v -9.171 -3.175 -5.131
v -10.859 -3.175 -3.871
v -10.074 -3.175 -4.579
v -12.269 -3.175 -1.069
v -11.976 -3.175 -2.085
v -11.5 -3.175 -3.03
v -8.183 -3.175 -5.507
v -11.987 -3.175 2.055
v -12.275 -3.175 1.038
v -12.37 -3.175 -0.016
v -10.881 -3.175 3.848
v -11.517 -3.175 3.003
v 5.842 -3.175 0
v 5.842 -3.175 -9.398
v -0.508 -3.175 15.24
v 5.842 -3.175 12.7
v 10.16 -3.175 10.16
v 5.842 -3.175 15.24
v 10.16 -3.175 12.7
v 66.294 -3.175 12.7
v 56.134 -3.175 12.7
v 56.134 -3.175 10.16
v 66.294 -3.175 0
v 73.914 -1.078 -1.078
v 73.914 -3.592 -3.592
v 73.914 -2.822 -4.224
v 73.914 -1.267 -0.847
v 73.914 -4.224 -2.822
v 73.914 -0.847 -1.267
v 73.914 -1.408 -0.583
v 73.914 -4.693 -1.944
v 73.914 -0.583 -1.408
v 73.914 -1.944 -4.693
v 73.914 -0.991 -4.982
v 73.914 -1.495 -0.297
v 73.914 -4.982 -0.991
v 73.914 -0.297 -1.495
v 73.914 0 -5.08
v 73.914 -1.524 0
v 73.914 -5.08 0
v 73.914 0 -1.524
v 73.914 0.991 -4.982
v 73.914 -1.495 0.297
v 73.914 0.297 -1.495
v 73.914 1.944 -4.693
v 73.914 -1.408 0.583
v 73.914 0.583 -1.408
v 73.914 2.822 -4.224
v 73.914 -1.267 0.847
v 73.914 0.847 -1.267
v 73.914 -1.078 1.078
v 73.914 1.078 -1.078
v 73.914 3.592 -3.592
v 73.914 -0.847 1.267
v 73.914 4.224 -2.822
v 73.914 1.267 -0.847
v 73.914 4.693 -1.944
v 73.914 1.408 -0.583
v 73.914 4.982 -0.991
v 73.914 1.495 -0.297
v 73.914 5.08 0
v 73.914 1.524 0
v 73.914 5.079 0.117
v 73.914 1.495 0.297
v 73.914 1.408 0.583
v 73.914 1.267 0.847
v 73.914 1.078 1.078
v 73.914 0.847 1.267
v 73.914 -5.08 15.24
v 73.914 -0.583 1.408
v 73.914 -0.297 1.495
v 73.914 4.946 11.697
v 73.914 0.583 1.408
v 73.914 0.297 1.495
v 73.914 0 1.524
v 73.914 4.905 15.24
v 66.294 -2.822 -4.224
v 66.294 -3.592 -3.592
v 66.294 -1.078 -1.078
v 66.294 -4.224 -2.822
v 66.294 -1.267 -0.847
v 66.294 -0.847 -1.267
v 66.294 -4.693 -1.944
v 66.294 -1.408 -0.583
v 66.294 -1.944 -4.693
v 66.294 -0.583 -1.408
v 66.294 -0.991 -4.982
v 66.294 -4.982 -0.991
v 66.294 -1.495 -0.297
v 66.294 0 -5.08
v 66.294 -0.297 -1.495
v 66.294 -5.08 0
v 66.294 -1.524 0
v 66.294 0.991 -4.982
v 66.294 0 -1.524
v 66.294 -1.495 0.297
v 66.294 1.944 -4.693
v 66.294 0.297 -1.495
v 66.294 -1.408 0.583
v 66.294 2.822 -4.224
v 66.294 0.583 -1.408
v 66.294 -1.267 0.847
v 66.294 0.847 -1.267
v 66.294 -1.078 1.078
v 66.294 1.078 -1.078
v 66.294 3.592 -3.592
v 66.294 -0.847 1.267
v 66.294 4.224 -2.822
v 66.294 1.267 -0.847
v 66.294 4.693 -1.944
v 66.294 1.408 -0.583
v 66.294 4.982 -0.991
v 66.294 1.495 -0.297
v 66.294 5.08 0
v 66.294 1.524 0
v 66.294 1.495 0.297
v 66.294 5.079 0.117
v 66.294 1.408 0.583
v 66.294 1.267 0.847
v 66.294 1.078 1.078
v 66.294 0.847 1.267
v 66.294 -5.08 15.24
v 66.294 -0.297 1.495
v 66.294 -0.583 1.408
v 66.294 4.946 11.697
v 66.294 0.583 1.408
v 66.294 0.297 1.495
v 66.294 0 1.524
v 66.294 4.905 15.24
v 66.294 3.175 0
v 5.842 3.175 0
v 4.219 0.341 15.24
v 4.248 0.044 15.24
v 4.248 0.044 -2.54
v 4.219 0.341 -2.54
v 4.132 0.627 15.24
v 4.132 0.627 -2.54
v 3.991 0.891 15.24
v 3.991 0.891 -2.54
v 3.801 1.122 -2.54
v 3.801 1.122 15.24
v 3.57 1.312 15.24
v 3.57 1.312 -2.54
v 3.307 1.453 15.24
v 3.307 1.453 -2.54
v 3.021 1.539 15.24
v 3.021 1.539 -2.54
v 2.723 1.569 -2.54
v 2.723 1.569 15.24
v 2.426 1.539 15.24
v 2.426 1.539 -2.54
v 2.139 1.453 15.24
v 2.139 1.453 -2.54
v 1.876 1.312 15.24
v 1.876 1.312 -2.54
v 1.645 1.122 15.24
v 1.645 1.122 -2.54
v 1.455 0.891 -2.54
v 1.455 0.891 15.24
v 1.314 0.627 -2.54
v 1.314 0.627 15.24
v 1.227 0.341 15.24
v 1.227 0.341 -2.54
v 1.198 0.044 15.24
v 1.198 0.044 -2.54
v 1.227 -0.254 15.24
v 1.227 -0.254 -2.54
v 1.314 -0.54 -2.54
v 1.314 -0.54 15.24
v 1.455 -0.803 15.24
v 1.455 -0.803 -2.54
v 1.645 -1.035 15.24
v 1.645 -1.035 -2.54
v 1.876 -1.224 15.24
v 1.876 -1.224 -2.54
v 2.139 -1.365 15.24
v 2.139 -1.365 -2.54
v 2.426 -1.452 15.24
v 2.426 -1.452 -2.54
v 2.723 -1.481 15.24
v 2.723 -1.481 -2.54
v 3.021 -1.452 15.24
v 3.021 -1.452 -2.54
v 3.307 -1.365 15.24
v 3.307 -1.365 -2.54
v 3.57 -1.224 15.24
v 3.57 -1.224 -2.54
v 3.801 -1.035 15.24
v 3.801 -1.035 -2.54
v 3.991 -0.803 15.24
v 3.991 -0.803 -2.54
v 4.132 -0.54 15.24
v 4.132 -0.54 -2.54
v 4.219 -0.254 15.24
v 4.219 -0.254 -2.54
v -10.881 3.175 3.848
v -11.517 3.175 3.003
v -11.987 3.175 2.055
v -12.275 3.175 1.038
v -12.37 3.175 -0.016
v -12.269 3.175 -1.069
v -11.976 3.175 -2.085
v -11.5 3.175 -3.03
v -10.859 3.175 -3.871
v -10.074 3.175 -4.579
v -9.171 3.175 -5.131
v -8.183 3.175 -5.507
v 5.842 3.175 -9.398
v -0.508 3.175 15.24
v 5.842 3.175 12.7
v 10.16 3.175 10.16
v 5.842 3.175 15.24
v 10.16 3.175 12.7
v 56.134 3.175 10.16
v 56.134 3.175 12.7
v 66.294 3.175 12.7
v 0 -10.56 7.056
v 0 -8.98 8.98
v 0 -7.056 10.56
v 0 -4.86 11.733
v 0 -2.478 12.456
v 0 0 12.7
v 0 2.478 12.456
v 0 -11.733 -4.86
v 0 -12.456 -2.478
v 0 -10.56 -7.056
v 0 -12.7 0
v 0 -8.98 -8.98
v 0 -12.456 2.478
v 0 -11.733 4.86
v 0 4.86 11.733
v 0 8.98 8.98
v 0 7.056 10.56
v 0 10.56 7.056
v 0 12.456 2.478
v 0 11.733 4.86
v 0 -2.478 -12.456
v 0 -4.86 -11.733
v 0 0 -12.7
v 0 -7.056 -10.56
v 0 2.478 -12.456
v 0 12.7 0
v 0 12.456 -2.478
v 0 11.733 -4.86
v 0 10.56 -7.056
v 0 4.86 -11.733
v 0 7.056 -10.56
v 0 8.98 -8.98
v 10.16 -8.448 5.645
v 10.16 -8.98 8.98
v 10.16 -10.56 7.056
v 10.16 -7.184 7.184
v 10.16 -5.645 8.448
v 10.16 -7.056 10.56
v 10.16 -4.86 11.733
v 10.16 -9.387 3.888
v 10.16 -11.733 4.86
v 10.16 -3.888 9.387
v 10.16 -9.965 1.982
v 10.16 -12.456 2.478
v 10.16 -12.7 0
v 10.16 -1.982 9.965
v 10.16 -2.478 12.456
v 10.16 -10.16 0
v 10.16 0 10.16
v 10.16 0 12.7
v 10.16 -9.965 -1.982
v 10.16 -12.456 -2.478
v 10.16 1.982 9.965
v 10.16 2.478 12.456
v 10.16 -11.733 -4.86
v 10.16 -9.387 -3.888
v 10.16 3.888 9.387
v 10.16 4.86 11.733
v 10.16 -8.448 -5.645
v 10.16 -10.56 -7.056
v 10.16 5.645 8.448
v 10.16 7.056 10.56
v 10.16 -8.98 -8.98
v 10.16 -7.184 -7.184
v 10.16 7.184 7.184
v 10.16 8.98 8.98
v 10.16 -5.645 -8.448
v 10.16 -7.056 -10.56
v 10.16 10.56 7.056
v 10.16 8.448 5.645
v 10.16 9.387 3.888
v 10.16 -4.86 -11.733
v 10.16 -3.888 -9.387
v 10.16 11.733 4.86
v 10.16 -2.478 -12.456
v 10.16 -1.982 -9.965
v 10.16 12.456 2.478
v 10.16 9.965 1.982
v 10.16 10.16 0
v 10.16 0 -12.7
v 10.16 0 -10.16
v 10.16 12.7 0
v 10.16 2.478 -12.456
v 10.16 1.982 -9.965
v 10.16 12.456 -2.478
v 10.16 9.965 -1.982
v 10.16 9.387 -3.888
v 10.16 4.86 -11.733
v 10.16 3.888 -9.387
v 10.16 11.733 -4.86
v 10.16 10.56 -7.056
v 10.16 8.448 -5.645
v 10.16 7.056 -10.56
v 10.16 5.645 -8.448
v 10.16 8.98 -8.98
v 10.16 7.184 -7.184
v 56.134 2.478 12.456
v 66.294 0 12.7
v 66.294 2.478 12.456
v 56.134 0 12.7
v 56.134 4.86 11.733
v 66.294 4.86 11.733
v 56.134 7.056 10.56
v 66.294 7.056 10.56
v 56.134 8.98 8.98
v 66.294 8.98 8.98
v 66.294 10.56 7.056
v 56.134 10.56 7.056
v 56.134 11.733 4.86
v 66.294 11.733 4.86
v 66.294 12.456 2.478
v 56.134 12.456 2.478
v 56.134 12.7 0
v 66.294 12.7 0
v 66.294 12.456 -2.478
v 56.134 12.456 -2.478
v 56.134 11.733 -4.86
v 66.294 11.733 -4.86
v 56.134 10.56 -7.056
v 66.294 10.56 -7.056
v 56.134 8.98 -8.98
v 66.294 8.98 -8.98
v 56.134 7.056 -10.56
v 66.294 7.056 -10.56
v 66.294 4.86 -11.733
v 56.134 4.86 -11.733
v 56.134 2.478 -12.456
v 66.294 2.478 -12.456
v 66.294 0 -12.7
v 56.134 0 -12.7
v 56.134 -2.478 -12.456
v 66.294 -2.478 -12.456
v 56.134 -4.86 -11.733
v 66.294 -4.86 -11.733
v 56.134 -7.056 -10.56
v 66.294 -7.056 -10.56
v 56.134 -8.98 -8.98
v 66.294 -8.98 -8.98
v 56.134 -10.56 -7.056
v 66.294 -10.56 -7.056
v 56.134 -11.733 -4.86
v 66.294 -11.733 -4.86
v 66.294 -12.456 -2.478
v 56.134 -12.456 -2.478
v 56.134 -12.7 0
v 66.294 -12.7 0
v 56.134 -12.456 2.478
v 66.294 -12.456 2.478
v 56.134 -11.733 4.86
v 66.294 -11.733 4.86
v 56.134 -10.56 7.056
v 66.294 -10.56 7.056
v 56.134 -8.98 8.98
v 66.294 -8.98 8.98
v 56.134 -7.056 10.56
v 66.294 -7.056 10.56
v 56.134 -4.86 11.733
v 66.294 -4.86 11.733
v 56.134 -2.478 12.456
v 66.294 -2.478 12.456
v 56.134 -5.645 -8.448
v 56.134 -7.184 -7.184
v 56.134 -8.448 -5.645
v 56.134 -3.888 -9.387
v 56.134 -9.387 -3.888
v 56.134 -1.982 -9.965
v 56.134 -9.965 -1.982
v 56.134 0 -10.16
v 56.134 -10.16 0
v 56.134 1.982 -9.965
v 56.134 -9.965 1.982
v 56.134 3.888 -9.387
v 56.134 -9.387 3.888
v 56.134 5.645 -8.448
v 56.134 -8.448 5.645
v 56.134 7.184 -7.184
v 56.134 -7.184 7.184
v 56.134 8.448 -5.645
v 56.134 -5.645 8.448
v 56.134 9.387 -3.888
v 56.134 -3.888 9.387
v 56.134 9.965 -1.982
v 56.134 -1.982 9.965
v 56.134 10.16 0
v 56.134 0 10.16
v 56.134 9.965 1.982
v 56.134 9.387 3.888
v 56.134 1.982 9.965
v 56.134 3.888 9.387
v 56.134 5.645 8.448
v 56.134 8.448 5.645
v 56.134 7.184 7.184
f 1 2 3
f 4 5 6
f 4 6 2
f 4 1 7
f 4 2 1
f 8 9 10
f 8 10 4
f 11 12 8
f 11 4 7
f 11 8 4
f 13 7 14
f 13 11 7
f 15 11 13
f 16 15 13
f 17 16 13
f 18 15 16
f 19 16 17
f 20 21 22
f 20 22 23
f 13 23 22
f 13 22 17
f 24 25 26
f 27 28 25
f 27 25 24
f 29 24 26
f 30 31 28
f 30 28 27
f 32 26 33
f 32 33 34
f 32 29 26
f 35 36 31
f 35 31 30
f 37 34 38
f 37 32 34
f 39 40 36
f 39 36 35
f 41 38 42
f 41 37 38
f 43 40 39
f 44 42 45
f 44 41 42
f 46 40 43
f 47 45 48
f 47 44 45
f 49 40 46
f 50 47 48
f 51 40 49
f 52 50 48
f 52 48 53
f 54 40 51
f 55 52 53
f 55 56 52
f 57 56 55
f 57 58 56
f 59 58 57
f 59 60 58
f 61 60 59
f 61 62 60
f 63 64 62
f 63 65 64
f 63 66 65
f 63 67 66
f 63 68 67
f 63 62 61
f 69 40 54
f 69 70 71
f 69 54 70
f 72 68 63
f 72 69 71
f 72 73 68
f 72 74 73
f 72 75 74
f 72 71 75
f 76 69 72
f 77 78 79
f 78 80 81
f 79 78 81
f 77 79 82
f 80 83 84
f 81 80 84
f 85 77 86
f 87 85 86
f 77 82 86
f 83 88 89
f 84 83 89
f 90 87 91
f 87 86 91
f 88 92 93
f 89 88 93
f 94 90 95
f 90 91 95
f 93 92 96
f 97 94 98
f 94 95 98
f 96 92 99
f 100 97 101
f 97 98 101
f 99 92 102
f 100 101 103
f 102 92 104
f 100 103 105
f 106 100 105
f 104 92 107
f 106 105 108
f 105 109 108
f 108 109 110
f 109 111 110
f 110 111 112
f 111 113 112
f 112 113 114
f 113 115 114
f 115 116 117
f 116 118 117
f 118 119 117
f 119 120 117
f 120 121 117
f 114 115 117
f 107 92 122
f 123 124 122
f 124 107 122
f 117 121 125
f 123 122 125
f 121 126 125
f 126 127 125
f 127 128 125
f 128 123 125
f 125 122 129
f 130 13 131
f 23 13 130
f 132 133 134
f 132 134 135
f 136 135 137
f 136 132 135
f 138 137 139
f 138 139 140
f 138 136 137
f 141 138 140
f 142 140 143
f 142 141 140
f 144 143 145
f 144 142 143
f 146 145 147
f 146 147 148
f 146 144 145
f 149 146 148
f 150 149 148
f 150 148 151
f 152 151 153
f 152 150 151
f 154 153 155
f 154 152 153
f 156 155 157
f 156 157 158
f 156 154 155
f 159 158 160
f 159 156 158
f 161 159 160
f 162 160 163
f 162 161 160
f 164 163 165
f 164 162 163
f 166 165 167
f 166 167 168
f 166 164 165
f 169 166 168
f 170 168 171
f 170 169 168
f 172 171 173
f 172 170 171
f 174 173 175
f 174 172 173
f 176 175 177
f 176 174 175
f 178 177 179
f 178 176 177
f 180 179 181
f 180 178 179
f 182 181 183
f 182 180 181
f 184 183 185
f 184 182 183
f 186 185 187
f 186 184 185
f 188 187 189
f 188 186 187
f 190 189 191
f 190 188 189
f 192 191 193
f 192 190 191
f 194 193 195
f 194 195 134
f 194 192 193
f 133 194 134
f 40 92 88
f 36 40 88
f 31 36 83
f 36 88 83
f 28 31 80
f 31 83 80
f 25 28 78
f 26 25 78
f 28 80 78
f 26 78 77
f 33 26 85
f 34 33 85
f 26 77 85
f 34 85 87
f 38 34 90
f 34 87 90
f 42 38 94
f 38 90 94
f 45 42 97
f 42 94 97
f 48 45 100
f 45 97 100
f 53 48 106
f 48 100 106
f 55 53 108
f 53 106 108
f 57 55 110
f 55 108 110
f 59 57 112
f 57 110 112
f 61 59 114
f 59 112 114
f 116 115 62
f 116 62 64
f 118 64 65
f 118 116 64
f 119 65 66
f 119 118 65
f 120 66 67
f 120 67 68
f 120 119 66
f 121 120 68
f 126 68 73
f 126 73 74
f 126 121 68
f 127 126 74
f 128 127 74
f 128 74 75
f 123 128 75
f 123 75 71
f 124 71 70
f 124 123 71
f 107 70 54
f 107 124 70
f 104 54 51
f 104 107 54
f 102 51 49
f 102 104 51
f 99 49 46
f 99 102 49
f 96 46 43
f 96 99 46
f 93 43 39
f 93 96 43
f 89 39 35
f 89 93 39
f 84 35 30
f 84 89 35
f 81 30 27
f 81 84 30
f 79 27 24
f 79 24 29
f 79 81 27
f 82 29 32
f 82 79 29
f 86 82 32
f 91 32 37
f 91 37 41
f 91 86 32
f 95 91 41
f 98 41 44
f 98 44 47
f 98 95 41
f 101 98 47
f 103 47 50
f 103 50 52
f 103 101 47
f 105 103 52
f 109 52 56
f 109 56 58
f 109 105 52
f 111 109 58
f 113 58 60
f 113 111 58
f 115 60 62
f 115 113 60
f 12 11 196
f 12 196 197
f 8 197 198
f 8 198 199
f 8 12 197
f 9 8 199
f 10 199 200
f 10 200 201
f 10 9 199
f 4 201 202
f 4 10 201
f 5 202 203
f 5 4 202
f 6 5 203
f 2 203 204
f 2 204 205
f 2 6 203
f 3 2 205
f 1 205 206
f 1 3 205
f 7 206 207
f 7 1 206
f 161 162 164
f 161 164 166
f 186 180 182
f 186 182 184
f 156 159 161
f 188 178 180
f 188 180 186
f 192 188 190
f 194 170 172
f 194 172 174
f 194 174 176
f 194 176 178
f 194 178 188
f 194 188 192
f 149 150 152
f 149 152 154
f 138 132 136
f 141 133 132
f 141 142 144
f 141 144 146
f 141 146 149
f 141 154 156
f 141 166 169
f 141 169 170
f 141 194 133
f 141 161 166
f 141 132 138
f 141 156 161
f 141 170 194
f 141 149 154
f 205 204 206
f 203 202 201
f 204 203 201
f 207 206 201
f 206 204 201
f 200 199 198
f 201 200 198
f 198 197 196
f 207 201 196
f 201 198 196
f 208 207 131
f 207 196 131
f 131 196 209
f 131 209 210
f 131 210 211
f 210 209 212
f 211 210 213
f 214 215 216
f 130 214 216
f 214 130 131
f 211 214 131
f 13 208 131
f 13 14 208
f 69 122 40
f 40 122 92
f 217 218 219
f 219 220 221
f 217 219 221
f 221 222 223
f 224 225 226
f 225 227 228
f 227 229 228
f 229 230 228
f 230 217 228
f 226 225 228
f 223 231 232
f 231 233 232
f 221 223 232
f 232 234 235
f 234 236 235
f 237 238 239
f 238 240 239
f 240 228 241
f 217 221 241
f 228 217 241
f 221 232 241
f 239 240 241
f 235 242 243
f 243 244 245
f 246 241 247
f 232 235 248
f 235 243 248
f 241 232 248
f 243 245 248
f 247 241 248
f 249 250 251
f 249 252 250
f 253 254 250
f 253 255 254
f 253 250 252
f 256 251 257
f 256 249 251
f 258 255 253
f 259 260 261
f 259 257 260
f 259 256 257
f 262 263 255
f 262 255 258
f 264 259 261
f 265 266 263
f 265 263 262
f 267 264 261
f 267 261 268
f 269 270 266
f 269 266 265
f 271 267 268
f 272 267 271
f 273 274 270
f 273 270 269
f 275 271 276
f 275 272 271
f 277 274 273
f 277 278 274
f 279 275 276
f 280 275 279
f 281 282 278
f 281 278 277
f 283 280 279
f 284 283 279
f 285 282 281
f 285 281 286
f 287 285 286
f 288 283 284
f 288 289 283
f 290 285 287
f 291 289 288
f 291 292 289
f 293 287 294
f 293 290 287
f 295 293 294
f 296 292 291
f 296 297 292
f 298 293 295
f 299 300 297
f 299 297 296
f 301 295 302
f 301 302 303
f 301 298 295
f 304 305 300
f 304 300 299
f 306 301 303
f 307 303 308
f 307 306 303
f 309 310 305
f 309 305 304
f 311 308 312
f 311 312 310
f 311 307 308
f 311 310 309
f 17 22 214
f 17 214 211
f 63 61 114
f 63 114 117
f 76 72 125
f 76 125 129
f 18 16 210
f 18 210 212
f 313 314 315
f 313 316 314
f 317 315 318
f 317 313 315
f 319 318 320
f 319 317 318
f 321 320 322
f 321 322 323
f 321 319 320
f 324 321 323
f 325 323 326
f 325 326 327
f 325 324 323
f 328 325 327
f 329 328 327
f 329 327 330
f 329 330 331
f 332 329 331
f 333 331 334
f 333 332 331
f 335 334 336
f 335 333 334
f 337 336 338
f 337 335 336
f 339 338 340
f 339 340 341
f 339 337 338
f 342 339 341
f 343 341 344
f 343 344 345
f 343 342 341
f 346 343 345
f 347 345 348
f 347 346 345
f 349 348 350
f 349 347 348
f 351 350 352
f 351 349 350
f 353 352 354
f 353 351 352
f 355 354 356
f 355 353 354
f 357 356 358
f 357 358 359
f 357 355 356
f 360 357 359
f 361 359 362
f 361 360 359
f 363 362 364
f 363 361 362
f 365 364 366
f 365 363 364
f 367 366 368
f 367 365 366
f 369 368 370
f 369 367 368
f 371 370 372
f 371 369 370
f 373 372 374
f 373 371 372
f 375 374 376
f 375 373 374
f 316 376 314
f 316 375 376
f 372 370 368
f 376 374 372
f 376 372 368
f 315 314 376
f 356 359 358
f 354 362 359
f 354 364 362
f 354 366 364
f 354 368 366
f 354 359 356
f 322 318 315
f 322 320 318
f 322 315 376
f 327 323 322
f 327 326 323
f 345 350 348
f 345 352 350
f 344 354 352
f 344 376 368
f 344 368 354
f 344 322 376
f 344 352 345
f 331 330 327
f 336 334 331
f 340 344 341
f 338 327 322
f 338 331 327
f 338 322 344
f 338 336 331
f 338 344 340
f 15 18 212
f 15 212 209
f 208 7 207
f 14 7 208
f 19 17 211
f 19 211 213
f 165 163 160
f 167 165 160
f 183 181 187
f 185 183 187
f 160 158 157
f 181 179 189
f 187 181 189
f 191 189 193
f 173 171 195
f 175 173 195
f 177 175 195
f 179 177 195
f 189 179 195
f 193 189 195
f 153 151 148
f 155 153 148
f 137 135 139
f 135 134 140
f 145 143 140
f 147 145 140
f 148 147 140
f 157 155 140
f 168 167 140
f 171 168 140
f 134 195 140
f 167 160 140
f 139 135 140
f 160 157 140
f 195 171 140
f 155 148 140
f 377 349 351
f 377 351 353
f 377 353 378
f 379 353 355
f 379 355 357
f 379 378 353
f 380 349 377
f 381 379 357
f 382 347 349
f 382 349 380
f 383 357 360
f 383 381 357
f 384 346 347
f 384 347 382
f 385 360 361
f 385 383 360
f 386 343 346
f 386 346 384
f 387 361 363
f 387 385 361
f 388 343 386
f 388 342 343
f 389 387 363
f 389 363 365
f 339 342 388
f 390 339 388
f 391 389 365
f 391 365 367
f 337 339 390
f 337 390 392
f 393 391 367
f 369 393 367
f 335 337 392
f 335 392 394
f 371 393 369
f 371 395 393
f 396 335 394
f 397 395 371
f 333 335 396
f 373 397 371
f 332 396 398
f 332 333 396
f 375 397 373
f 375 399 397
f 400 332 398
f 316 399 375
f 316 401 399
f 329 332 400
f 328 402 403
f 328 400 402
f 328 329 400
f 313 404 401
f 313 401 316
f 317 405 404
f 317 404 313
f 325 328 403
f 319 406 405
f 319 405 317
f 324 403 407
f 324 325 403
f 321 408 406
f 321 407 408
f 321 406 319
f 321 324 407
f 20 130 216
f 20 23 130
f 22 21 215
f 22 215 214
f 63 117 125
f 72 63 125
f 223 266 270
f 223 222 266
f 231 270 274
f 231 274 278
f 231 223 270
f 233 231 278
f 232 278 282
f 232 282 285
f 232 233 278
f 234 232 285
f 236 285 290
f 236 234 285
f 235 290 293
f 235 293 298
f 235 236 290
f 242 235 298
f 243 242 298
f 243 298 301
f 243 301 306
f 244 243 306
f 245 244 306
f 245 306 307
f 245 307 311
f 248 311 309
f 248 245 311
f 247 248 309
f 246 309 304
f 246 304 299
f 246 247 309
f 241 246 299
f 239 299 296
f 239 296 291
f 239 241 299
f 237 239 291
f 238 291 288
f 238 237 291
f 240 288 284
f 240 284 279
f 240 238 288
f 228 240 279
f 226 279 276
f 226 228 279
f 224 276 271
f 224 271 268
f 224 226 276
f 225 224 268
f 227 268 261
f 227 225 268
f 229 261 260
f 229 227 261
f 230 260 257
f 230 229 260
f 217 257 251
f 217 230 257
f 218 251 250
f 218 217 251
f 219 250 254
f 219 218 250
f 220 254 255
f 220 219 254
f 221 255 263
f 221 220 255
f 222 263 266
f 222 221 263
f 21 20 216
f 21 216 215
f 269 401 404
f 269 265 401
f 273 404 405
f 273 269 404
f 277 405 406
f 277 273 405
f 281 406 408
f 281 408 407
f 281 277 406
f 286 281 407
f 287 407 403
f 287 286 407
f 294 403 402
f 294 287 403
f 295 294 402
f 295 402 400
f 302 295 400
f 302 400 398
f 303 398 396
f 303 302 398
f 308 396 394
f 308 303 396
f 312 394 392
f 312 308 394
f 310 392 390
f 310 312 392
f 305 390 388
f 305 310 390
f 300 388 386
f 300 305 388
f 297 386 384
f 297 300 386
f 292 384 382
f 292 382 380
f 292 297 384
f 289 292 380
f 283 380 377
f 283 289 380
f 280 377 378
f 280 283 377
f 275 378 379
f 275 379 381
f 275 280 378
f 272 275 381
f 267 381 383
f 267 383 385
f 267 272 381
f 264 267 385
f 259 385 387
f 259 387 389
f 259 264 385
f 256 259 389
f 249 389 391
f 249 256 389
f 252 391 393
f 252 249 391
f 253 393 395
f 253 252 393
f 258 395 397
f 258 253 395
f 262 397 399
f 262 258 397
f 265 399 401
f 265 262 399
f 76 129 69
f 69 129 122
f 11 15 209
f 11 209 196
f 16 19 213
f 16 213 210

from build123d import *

# Parameters (mm, degrees)
F0_W     = 5.842
F0_H     = 12.7
F0_R     = 3.175
F2_DEPTH = 3.175
F3_R     = 1.524
F4_DEPTH = 7.62
F6_R     = 1.524984407
F7_DEPTH = 17.78
F5_R     = 1.524
F8_DEPTH = 10.414


with BuildPart() as f1:
    # F0 (on Front) → F1 (revolve)
    with BuildSketch(Plane.XZ):
        Polygon((5.842, 12.7), (5.842, 0), (66.294, 0), (66.294, 12.7), (56.134, 12.7), (56.134, 10.16), (10.16, 10.16), (10.16, 12.7), align=None)
        with Locations((2.921, 6.35)):
            Rectangle(F0_W, F0_H)
    revolve(axis=Axis((33.147, 0, 0), (-1, 0, 0)))


with BuildPart() as f2:
    # F0 (on Front) → F2 (new body, symmetric)
    with BuildSketch(Plane.XZ):
        Polygon((5.842, 12.7), (5.842, 0), (66.294, 0), (66.294, 12.7), (56.134, 12.7), (56.134, 10.16), (10.16, 10.16), (10.16, 12.7), align=None)
        with BuildLine():
            ThreePointArc((-8.1826630726, -5.5069827884), (-3.1957909266, -4.5493385486), (-0.9398, 0))
            ThreePointArc((-0.9398, 0), (-4.5919612295, 5.3297205562), (-10.8806298187, 3.8475430269))
            ThreePointArc((-10.8806298187, 3.8475430269), (-12.1459778134, -1.5837270034), (-8.1826630726, -5.5069827884))
        make_face()
        with Locations((-6.6548, 0)):
            Circle(F0_R, mode=Mode.SUBTRACT)
        with BuildLine():
            Line((-0.9398, 0), (0, 0))
            Line((0, 0), (0, 12.7))
            Line((0, 12.7), (5.842, 12.7))
            Line((5.842, 12.7), (5.842, 15.24))
            Line((5.842, 15.24), (-0.508, 15.24))
            Line((-0.508, 15.24), (-10.8806298187, 3.8475430269))
            ThreePointArc((-10.8806298187, 3.8475430269), (-4.5919612295, 5.3297205562), (-0.9398, 0))
        make_face()
        with Locations((2.921, 6.35)):
            Rectangle(F0_W, F0_H)
        with BuildLine():
            Line((5.842, 0), (0, 0))
            Line((0, 0), (-0.9398, 0))
            ThreePointArc((-0.9398, 0), (-3.1957909266, -4.5493385486), (-8.1826630726, -5.5069827884))
            Line((-8.1826630726, -5.5069827884), (5.842, -9.398))
            Line((5.842, -9.398), (5.842, 0))
        make_face()
        with Locations((-6.6548, 0)):
            Circle(F0_R)
    extrude(amount=F2_DEPTH, both=True)


with BuildPart() as f4:
    # F3 (on face) → F4 (new body)
    with BuildSketch(Plane.YZ.offset(66.294)):
        with BuildLine():
            Line((-5.08, 11.6397422652), (-5.08, 0))
            ThreePointArc((-5.08, 0), (-0.0582774056, 5.0796657118), (5.0786628913, 0.1165471414))
            Line((5.0786628913, 0.1165471414), (4.9457994608, 11.6973957655))
            ThreePointArc((4.9457994608, 11.6973957655), (-0.0730303205, 12.6997900208), (-5.08, 11.6397422652))
        make_face()
        with BuildLine():
            Line((-5.08, 15.24), (-5.08, 11.6397422652))
            ThreePointArc((-5.08, 11.6397422652), (-0.0730303205, 12.6997900208), (4.9457994608, 11.6973957655))
            Line((4.9457994608, 11.6973957655), (4.9051562776, 15.24))
            Line((4.9051562776, 15.24), (-5.08, 15.24))
        make_face()
        with BuildLine():
            ThreePointArc((5.0786628913, 0.1165471414), (-0.0582774056, 5.0796657118), (-5.08, 0))
            ThreePointArc((-5.08, 0), (0, -5.08), (5.08, 0))
            Line((5.08, 0), (5.0786628913, 0.1165471414))
        make_face()
        Circle(F3_R, mode=Mode.SUBTRACT)
    extrude(amount=F4_DEPTH)

    # F5 (on face) → F8 (join)
    with BuildSketch(Plane.XY.offset(15.24)):
        with Locations((69.7052180767, 0.1330839295)):
            Circle(F5_R)
    extrude(amount=-F8_DEPTH)


with BuildPart() as f7:
    # F6 (on face) → F7 (new body)
    with BuildSketch(Plane.XY.offset(15.24)):
        with Locations((2.7230642736, 0.0437548333)):
            Circle(F6_R)
    extrude(amount=-F7_DEPTH)


solid = Compound([f1.part, f2.part, f4.part, f7.part])
